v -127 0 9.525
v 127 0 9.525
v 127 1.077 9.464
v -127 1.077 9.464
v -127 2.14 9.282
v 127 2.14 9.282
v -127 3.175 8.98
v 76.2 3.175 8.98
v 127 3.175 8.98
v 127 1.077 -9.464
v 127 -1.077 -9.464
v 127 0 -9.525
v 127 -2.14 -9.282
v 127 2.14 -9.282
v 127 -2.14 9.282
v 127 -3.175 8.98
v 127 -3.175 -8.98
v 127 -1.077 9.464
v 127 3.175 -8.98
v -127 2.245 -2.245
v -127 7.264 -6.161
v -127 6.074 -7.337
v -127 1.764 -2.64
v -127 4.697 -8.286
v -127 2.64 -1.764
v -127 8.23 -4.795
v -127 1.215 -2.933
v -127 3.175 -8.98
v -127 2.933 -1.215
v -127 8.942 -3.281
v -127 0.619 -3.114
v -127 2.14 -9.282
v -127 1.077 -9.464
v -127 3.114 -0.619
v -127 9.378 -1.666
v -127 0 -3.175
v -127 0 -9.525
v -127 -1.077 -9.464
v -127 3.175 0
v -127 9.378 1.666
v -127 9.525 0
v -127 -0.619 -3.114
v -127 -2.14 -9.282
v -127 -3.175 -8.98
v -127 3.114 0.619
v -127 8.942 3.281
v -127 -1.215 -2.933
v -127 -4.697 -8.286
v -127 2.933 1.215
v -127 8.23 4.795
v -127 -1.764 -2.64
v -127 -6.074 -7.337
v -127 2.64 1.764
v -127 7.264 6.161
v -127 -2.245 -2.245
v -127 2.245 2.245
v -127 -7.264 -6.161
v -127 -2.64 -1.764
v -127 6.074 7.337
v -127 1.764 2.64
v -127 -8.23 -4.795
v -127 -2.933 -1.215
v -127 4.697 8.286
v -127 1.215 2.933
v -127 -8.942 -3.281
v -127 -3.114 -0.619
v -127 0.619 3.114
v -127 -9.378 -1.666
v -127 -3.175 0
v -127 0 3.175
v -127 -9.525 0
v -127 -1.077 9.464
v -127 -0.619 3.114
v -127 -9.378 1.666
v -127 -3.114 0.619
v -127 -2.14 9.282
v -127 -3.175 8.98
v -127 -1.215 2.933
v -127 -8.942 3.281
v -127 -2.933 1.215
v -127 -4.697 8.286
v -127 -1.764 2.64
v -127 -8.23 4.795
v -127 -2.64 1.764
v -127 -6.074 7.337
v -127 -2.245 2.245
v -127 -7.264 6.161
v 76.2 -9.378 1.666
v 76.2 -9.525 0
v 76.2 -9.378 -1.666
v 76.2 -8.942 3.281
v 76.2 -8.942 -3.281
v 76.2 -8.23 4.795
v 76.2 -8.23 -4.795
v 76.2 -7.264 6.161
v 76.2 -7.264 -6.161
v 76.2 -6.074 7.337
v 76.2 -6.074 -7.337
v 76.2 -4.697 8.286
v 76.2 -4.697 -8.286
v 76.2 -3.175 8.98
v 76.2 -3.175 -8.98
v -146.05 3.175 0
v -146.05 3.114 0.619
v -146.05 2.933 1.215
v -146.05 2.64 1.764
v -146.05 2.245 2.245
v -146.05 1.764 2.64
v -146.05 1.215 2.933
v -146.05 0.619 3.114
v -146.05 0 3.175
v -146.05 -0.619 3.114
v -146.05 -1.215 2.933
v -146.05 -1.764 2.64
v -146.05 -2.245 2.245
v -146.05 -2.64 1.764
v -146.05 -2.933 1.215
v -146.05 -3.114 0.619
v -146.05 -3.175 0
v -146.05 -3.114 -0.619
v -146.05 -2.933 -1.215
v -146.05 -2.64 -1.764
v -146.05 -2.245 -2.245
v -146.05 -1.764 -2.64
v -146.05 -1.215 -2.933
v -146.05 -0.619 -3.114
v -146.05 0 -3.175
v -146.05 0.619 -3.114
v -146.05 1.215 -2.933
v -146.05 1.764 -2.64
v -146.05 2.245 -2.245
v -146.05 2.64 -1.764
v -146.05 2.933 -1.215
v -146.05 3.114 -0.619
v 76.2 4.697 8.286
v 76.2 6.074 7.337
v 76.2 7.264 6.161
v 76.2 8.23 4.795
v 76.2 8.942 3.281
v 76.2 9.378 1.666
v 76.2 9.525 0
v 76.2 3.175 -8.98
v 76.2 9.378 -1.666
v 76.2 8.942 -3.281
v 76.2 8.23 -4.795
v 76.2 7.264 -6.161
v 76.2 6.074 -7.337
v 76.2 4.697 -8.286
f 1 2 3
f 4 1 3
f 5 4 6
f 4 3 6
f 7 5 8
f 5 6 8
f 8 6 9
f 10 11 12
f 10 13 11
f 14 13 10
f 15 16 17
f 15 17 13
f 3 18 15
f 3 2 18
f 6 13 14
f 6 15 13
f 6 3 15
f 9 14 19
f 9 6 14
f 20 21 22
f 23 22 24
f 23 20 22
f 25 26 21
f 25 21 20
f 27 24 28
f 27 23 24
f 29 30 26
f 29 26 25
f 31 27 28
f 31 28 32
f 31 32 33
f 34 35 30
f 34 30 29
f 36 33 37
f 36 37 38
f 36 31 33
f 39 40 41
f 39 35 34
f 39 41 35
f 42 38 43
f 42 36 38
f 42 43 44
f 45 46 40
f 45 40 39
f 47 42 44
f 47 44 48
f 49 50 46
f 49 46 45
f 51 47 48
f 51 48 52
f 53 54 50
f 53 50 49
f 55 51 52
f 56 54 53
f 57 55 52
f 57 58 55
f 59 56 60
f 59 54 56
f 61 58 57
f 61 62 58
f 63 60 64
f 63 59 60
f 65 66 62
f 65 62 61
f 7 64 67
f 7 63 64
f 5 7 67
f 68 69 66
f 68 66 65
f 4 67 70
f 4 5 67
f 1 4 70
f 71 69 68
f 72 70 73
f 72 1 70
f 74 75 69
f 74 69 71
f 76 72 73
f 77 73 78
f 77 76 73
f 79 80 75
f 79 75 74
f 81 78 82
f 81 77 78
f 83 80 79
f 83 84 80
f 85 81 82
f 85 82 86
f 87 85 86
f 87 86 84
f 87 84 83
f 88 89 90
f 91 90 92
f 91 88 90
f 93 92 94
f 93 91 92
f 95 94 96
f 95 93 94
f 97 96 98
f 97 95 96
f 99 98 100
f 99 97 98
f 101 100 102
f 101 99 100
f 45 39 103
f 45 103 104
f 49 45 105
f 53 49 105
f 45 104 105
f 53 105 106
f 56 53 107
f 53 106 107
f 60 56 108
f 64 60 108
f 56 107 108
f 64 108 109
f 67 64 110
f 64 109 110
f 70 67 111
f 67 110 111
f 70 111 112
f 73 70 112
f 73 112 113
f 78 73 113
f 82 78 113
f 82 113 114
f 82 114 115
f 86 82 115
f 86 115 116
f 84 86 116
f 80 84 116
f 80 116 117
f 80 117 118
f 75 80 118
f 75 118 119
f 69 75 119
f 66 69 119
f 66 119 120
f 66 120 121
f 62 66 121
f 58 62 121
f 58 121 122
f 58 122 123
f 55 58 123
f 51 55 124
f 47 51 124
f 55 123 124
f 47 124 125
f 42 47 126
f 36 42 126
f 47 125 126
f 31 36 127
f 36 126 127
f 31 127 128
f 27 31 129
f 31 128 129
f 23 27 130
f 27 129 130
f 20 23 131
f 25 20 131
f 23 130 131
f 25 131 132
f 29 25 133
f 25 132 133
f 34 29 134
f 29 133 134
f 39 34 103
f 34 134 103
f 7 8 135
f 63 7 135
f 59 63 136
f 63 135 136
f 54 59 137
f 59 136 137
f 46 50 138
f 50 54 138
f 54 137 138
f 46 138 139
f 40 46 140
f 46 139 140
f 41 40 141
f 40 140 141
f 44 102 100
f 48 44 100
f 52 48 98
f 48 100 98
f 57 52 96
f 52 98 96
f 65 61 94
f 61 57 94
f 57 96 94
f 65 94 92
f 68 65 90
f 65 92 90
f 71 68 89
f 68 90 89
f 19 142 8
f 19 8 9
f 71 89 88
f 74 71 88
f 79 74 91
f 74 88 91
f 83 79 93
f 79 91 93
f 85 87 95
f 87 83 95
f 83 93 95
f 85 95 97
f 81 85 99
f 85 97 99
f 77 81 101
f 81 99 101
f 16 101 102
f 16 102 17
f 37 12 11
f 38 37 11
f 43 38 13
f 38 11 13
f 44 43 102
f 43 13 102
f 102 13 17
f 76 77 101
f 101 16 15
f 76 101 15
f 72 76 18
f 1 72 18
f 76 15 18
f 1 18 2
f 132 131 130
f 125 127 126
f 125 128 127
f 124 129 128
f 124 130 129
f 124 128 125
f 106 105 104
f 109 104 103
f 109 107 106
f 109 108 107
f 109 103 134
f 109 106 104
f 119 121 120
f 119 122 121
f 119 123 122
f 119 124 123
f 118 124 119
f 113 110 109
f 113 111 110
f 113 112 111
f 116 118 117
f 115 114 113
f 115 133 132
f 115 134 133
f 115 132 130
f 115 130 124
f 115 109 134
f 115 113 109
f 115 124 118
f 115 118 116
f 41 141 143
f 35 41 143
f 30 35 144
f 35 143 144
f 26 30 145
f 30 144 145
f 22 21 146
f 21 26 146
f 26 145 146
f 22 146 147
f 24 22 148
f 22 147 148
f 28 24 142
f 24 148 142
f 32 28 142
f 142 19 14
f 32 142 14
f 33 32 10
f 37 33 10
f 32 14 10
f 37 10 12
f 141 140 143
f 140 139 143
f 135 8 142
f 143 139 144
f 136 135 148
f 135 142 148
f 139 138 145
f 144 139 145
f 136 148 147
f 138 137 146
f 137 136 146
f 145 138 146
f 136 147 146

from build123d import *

# Parameters (mm, degrees)
F0_W     = 19.05
F0_H     = 3.175
F1_DEPTH = 9.525
F2_W     = 50.8
F2_H     = 6.35
F3_DEPTH = 12.7
F5_DEPTH = 273.051
F7_DEPTH = 19.05
F8_DEPTH = 19.05


with BuildPart() as f1:
    # F0 (on Top) → F1 (new body, symmetric)
    with BuildSketch(Plane.XY):
        Polygon((-127, 0), (127, 0), (127, 9.525), (-127, 9.525), (-127, 3.175), align=None)
        Polygon((-127, -3.175), (-127, -9.525), (127, -9.525), (127, 0), (-127, 0), align=None)
        with Locations((-136.525, 1.5875)):
            Rectangle(F0_W, F0_H)
        with Locations((-136.525, -1.5875)):
            Rectangle(F0_W, F0_H)
    extrude(amount=F1_DEPTH, both=True)

    # F2 (on Top) → F3 (cut, symmetric)
    with BuildSketch(Plane.XY):
        with Locations((101.6, 6.35)):
            Rectangle(F2_W, F2_H)
        with Locations((101.6, -6.35)):
            Rectangle(F2_W, F2_H)
    extrude(amount=F3_DEPTH, both=True, mode=Mode.SUBTRACT)

    # F4 (on face) → F5 (cut, through all)
    with BuildSketch(Plane.YZ.offset(127)):
        with BuildLine():
            ThreePointArc((-9.525, 0), (-7.77713, 5.499261), (-3.175, 8.980256))
            Line((-3.175, 8.980256), (-3.175, 9.525))
            Line((-3.175, 9.525), (-9.525, 9.525))
            Line((-9.525, 9.525), (-9.525, 0))
        make_face()
        with BuildLine():
            Line((-3.175, -9.525), (-3.175, -8.980256))
            ThreePointArc((-3.175, -8.980256), (-7.77713, -5.499261), (-9.525, 0))
            Line((-9.525, 0), (-9.525, -9.525))
            Line((-9.525, -9.525), (-3.175, -9.525))
        make_face()
        with BuildLine():
            Line((9.525, -9.525), (9.525, 0))
            ThreePointArc((9.525, 0), (7.77713, -5.499261), (3.175, -8.980256))
            Line((3.175, -8.980256), (3.175, -9.525))
            Line((3.175, -9.525), (9.525, -9.525))
        make_face()
        with BuildLine():
            ThreePointArc((3.175, 8.980256), (7.77713, 5.499261), (9.525, 0))
            Line((9.525, 0), (9.525, 9.525))
            Line((9.525, 9.525), (3.175, 9.525))
            Line((3.175, 9.525), (3.175, 8.980256))
        make_face()
        with BuildLine():
            ThreePointArc((0, 9.525), (1.610696, 9.387826), (3.175, 8.980256))
            Line((3.175, 8.980256), (3.175, 9.525))
            Line((3.175, 9.525), (0, 9.525))
        make_face()
        with BuildLine():
            ThreePointArc((-3.175, 8.980256), (-1.610696, 9.387826), (0, 9.525))
            Line((0, 9.525), (-3.175, 9.525))
            Line((-3.175, 9.525), (-3.175, 8.980256))
        make_face()
        with BuildLine():
            Line((-3.175, -9.525), (0, -9.525))
            ThreePointArc((0, -9.525), (-1.610696, -9.387826), (-3.175, -8.980256))
            Line((-3.175, -8.980256), (-3.175, -9.525))
        make_face()
        with BuildLine():
            Line((3.175, -9.525), (3.175, -8.980256))
            ThreePointArc((3.175, -8.980256), (1.610696, -9.387826), (0, -9.525))
            Line((0, -9.525), (3.175, -9.525))
        make_face()
    extrude(amount=-F5_DEPTH, mode=Mode.SUBTRACT)

    # F6 (on face) → F7 (cut)
    with BuildSketch(Plane(origin=(-146.05, 0, 0), x_dir=(0, -1, 0), z_dir=(-1, 0, 0))):
        with BuildLine():
            ThreePointArc((-3.175, 0), (0, 3.175), (3.175, 0))
            Line((3.175, 0), (3.175, 8.980256))
            ThreePointArc((3.175, 8.980256), (1.610696, 9.387826), (0, 9.525))
            ThreePointArc((0, 9.525), (-1.610696, 9.387826), (-3.175, 8.980256))
            Line((-3.175, 8.980256), (-3.175, 0))
        make_face()
    extrude(amount=-F7_DEPTH, mode=Mode.SUBTRACT)

    # F6 (on face) → F8 (cut)
    with BuildSketch(Plane(origin=(-146.05, 0, 0), x_dir=(0, -1, 0), z_dir=(-1, 0, 0))):
        with BuildLine():
            Line((3.175, -8.980256), (3.175, 0))
            ThreePointArc((3.175, 0), (0, -3.175), (-3.175, 0))
            Line((-3.175, 0), (-3.175, -8.980256))
            ThreePointArc((-3.175, -8.980256), (-1.610696, -9.387826), (0, -9.525))
            ThreePointArc((0, -9.525), (1.610696, -9.387826), (3.175, -8.980256))
        make_face()
    extrude(amount=-F8_DEPTH, mode=Mode.SUBTRACT)


solid = f1.part
